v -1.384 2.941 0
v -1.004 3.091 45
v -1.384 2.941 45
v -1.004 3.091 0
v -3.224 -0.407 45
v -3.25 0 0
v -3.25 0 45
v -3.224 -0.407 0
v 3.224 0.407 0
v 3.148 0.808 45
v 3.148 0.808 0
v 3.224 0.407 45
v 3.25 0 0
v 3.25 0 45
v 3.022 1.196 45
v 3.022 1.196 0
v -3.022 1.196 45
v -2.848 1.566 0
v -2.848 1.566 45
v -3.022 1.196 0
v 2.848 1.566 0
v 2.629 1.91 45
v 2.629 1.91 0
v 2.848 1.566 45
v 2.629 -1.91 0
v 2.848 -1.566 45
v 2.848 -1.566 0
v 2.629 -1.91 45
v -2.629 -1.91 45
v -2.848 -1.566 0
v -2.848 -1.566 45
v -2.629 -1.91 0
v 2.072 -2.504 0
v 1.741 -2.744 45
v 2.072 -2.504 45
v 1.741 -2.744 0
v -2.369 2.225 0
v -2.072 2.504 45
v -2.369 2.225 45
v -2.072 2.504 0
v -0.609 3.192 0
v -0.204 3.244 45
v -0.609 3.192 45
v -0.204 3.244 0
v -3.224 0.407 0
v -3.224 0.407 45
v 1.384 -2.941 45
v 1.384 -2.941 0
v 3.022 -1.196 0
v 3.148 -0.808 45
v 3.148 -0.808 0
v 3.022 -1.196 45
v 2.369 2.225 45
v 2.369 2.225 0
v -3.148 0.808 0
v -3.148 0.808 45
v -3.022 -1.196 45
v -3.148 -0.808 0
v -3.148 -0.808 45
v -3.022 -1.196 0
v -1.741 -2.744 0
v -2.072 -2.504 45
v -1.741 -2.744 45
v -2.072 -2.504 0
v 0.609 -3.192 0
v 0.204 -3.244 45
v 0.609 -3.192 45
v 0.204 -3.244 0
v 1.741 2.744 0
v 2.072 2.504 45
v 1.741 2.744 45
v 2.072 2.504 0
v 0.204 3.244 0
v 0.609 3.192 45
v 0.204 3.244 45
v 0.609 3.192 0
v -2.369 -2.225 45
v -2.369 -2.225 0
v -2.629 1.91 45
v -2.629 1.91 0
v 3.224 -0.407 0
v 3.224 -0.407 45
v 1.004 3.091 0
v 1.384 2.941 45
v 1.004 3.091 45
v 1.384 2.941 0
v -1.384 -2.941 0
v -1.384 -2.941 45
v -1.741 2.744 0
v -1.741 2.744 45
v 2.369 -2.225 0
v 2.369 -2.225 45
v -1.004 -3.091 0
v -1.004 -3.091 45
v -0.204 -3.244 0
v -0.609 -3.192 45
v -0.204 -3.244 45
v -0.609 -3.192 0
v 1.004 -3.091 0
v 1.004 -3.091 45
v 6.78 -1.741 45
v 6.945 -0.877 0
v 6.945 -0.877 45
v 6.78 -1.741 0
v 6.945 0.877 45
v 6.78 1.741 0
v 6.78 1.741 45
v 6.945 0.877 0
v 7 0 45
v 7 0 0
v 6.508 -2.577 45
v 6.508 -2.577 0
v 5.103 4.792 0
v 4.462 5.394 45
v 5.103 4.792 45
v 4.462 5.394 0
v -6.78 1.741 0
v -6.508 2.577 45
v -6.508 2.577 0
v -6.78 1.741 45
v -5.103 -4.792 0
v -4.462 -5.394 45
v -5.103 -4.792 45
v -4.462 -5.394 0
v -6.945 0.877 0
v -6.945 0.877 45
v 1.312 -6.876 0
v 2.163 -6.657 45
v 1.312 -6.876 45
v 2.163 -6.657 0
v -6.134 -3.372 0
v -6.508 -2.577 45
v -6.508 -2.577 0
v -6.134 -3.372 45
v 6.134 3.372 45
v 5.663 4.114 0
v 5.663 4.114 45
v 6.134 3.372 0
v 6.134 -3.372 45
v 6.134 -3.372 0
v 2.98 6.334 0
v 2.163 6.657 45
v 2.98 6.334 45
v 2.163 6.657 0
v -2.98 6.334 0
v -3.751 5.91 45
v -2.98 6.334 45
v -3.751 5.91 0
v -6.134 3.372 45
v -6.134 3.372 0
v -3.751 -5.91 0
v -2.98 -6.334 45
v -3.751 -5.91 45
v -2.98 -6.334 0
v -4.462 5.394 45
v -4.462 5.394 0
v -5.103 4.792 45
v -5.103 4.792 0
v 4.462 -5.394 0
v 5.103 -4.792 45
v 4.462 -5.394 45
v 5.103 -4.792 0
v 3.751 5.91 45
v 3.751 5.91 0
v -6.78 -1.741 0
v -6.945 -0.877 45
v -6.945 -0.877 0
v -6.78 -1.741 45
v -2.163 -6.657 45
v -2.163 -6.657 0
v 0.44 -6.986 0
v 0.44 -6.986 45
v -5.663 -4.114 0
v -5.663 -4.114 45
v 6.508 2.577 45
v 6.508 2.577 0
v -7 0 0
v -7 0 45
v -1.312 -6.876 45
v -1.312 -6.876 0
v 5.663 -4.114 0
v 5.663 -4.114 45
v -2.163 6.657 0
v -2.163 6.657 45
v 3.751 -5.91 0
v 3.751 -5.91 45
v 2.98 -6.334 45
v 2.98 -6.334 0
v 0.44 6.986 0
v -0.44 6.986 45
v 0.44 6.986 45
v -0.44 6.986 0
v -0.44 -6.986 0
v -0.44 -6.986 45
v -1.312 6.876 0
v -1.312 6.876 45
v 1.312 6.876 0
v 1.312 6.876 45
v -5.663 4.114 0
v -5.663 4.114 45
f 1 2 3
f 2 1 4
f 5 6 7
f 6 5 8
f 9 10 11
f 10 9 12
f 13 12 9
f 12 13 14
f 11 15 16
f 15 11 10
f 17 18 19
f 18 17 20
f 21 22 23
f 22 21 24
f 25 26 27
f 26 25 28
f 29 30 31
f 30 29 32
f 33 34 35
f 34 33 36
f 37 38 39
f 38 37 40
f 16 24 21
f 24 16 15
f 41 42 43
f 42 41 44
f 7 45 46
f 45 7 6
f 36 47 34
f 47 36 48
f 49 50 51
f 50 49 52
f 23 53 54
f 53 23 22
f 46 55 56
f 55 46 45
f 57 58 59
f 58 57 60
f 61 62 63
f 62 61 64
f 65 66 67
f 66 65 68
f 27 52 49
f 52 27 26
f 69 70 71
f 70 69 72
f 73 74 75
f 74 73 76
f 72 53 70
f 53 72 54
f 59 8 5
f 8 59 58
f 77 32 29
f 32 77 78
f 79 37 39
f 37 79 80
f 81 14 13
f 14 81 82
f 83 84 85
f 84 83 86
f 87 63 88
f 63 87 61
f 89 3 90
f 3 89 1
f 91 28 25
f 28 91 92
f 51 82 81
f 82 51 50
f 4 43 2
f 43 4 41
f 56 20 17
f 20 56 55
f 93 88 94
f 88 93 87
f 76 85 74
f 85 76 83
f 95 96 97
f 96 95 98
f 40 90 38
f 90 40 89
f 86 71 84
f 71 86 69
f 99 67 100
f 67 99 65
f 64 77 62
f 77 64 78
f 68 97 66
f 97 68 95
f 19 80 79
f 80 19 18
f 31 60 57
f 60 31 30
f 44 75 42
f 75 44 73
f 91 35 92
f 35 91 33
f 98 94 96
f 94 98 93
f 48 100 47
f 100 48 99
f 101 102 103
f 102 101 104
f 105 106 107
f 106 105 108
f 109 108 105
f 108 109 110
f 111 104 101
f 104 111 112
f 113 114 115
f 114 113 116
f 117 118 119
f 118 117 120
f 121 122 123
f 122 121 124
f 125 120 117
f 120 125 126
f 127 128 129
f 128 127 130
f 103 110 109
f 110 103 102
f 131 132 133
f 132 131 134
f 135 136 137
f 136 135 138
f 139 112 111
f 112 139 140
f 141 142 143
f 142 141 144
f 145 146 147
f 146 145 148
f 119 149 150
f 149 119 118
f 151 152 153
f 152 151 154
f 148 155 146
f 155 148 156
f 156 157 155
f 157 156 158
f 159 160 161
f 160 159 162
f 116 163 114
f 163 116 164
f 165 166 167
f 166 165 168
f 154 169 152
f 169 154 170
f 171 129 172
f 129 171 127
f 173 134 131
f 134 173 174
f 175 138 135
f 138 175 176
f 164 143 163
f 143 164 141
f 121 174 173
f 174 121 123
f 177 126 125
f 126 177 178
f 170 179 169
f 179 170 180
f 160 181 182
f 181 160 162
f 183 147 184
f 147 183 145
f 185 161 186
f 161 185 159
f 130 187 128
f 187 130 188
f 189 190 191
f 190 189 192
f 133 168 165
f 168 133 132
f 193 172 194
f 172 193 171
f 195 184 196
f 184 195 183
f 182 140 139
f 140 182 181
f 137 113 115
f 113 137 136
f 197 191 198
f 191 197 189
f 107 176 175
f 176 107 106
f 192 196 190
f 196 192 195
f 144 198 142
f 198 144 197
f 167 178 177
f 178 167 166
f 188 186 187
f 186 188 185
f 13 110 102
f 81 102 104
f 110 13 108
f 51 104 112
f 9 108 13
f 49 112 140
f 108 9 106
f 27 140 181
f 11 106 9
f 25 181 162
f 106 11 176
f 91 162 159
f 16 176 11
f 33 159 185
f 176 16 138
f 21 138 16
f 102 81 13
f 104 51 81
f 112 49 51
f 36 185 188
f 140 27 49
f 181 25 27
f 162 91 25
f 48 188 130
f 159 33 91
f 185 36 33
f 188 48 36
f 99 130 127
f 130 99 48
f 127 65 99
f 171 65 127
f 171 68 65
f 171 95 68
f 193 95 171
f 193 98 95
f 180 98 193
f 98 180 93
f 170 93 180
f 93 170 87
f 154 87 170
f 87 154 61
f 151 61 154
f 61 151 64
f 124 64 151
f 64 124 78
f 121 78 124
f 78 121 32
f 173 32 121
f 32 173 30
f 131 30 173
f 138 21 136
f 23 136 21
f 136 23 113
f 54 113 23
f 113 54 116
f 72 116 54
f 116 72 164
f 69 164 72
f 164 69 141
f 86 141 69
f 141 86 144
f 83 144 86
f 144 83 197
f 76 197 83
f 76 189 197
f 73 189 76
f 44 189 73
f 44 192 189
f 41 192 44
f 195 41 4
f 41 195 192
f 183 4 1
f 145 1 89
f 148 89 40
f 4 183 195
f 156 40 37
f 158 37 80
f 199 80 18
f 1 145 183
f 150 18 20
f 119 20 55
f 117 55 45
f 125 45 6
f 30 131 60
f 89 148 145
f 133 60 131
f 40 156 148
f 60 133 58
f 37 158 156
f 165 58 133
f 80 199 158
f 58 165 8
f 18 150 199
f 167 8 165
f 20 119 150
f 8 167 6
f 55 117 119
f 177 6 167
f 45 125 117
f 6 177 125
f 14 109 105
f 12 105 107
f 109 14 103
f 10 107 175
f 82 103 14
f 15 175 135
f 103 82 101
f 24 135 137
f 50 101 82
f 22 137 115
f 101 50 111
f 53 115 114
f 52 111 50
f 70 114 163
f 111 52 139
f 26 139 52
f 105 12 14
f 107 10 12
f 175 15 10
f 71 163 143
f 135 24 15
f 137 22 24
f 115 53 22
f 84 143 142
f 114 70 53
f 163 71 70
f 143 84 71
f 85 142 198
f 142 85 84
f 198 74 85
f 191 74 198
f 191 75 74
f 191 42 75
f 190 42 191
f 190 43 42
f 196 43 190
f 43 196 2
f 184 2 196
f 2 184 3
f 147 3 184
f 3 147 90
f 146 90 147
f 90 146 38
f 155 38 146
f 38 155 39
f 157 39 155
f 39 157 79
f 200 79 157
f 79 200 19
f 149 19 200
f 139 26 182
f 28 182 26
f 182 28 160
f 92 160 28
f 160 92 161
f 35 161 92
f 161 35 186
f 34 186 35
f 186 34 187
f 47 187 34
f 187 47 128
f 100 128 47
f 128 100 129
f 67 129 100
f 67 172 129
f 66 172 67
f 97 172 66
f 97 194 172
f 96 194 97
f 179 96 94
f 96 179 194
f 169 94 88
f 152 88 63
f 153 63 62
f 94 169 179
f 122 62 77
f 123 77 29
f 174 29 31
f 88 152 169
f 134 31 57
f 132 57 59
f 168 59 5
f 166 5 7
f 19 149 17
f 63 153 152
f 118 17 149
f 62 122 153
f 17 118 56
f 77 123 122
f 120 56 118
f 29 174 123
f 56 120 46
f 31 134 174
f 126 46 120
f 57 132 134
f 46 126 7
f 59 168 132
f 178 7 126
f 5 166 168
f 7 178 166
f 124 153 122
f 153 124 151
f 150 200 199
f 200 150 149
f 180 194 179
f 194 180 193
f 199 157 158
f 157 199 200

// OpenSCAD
$fn = 50;


difference() {
	union() {
		cylinder(h = 45, r = 7.0000000000);
	}
	union() {
		translate(v = [0.0000000000, 0.0000000000, -100.0000000000]) {
			cylinder(h = 200, r = 3.2500000000);
		}
		translate(v = [0.0000000000, 0.0000000000, -100.0000000000]) {
			cylinder(h = 200, r = 3.2500000000);
		}
		translate(v = [0.0000000000, 0.0000000000, -100.0000000000]) {
			cylinder(h = 200, r = 3.2500000000);
		}
		translate(v = [0.0000000000, 0.0000000000, -100.0000000000]) {
			cylinder(h = 200, r = 3.2500000000);
		}
	}
}
